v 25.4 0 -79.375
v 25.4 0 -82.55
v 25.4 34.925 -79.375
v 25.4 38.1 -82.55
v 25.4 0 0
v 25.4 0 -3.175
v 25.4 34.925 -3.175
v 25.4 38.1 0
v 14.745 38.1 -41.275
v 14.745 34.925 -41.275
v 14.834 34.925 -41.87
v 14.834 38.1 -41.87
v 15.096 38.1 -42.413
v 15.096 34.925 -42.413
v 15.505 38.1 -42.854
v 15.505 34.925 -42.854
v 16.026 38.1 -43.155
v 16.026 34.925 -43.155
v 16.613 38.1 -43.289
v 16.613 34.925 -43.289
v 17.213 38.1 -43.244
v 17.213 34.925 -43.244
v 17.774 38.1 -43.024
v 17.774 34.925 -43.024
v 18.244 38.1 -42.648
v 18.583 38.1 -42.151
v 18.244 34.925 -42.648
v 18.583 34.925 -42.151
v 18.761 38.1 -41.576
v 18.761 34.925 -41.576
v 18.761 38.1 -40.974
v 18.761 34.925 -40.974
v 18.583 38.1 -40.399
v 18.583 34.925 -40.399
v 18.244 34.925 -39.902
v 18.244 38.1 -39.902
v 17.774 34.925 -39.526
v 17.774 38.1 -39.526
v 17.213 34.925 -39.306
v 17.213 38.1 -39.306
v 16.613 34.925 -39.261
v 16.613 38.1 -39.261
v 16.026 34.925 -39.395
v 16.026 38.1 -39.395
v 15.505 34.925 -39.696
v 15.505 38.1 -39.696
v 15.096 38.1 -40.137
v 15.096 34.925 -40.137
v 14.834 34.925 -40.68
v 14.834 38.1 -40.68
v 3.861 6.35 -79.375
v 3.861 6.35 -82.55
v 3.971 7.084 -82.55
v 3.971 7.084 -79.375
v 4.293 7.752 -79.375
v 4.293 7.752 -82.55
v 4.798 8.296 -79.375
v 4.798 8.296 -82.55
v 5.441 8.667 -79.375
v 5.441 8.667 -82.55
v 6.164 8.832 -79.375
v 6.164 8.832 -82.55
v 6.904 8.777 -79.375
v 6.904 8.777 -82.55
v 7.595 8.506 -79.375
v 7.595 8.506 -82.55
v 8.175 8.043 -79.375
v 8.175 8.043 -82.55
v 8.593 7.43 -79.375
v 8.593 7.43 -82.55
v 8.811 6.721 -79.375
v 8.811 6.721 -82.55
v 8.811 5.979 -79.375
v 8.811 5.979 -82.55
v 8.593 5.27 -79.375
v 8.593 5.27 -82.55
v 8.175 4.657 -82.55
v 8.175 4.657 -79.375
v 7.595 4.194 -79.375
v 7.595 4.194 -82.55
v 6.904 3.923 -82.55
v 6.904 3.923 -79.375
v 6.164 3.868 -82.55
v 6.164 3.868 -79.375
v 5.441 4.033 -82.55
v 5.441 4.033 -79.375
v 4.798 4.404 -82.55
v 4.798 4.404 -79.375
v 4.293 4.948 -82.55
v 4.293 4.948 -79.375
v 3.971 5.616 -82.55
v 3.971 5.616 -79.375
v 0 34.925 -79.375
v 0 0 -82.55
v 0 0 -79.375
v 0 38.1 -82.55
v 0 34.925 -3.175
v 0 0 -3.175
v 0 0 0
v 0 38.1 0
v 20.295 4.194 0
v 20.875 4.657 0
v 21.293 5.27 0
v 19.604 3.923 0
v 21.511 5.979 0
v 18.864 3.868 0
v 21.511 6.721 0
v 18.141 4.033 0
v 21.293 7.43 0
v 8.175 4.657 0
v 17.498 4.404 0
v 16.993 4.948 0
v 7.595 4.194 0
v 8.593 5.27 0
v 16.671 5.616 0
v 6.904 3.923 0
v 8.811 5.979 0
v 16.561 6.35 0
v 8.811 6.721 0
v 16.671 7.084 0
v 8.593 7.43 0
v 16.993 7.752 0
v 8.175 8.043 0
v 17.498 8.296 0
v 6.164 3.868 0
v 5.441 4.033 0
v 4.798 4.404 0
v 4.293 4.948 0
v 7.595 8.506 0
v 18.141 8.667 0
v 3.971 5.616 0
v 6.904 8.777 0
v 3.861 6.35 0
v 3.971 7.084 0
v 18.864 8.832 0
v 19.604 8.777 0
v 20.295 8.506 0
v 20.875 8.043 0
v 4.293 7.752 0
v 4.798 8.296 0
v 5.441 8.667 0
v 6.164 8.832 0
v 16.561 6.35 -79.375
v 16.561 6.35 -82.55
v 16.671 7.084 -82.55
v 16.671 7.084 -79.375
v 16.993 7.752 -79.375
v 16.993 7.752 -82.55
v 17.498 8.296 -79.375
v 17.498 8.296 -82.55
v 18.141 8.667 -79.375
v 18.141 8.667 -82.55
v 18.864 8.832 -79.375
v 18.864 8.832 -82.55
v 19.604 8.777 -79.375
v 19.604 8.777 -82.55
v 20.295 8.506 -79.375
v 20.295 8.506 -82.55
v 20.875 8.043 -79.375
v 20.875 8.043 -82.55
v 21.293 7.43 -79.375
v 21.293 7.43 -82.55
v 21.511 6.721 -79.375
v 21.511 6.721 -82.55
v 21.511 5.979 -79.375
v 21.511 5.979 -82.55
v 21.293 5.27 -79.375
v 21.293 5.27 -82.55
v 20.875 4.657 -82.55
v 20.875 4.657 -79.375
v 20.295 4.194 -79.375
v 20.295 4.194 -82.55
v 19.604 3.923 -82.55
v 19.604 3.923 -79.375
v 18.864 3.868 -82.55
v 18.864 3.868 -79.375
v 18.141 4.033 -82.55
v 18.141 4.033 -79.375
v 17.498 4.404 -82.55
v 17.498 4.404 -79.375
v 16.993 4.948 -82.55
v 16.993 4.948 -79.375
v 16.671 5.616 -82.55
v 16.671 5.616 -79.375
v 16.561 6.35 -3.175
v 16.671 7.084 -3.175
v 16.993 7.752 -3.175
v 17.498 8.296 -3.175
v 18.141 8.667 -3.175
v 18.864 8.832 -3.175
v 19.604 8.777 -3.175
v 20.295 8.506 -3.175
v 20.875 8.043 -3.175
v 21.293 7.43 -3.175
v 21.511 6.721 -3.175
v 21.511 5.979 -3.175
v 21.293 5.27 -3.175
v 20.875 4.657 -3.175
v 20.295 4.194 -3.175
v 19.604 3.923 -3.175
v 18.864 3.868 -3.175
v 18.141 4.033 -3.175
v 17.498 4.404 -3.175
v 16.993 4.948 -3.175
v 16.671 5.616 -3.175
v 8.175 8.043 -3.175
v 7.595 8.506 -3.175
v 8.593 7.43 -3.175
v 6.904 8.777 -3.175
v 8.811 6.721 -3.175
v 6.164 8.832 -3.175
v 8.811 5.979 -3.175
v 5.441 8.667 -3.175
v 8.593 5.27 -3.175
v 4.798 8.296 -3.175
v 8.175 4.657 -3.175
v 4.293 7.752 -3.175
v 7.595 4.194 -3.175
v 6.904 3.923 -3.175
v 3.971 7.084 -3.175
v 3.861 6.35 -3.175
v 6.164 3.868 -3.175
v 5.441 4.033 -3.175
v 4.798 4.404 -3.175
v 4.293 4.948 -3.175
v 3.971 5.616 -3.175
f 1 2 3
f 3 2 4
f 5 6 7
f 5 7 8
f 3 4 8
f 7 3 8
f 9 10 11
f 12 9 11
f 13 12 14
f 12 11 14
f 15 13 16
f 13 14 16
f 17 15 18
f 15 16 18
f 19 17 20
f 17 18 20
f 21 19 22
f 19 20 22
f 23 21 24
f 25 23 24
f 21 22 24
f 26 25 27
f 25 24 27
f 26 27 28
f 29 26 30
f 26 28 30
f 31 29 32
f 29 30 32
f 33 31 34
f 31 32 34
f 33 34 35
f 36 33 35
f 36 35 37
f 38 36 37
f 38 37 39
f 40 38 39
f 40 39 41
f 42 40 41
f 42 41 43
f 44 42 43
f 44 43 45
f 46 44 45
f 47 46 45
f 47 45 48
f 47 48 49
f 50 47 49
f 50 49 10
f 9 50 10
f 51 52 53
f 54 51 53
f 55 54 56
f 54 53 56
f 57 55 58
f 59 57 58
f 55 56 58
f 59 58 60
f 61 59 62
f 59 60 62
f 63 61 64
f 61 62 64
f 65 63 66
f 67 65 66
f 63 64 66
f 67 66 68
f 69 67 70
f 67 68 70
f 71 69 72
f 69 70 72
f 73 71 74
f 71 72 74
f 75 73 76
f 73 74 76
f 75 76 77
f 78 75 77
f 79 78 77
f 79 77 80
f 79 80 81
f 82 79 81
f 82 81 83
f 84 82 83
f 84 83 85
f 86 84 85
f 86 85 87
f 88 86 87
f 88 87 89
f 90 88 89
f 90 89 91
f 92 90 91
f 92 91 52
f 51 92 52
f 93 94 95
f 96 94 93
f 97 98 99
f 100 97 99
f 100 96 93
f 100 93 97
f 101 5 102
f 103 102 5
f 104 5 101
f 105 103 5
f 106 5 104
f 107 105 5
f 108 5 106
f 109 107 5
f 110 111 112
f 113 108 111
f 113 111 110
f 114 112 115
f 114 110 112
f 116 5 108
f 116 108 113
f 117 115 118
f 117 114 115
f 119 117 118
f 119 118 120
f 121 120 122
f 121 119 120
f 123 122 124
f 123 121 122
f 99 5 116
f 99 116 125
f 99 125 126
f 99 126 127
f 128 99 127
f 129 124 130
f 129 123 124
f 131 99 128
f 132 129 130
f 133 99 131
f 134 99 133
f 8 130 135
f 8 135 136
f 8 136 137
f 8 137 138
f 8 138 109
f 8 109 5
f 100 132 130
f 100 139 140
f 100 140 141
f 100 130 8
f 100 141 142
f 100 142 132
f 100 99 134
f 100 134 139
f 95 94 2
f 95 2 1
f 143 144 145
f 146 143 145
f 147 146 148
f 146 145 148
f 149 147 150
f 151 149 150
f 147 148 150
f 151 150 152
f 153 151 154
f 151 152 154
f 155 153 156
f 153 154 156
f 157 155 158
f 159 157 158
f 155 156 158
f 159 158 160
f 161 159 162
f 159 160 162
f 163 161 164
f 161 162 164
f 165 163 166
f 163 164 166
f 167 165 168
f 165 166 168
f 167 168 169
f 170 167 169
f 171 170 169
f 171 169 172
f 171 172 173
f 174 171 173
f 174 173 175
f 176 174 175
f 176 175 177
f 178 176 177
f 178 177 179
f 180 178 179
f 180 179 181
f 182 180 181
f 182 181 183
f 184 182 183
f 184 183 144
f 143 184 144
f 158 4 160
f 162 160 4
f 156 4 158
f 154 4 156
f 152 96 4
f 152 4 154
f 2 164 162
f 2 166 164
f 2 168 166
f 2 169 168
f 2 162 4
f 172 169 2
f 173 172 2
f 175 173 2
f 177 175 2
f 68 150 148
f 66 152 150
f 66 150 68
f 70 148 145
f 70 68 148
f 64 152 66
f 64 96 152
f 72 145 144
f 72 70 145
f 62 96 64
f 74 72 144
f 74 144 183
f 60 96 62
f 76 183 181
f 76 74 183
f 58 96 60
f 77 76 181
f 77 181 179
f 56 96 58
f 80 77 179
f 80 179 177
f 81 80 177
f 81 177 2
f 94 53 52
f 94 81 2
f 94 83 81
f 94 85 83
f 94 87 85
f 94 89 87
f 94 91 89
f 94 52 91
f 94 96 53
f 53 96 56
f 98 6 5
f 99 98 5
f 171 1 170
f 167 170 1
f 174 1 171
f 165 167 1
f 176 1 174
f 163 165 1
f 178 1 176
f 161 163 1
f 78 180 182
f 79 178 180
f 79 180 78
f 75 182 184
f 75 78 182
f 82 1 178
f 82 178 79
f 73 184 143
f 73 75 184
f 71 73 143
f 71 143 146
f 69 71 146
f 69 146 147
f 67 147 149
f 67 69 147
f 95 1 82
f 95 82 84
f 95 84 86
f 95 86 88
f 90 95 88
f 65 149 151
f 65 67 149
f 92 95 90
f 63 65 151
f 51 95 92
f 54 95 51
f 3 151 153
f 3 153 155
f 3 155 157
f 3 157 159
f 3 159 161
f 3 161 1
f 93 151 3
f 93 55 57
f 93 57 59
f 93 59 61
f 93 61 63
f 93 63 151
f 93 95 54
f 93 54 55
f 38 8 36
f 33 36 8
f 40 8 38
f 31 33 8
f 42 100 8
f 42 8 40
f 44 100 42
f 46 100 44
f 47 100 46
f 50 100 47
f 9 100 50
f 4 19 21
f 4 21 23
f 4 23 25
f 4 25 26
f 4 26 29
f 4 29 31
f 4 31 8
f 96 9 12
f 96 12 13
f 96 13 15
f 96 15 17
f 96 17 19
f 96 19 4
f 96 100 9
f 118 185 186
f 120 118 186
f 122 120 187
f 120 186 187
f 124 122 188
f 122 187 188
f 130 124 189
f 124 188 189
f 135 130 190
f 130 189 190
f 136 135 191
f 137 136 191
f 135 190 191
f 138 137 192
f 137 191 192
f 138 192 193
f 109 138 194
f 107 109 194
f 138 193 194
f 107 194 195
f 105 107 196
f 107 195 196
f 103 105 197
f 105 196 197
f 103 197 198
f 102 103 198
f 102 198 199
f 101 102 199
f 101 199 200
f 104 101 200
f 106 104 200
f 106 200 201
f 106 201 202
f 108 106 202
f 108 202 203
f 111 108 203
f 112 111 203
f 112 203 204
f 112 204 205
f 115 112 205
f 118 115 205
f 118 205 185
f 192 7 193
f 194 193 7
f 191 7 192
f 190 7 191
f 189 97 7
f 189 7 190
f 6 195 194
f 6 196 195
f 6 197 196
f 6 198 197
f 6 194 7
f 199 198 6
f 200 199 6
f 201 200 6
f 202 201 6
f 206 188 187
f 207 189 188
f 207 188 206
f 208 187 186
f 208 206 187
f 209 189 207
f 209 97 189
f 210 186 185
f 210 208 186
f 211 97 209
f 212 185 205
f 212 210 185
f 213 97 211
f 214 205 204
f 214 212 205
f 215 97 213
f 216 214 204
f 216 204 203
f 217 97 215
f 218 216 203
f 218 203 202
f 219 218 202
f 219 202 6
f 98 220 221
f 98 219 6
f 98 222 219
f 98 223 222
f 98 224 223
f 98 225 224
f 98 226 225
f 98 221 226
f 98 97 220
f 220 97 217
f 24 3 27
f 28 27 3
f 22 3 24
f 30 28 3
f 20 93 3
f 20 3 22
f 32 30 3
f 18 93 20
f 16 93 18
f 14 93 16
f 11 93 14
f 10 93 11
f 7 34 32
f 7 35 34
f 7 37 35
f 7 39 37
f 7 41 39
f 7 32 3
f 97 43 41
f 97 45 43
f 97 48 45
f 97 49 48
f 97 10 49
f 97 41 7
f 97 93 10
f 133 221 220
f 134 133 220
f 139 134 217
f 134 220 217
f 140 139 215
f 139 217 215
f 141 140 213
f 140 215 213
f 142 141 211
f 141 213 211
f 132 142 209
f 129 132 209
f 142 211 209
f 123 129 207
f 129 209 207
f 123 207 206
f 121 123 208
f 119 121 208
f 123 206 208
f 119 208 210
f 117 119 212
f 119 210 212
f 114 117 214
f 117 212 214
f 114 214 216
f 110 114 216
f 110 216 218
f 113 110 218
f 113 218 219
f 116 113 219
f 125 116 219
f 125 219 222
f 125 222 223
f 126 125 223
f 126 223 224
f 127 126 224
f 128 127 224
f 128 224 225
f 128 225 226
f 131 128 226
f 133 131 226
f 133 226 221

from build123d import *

# Parameters (mm, degrees)
BOSS_EXTRUDE1_DEPTH        = 25.4
F_10_32_TAPPED_HOLE1_D     = 4.0386
F_10_32_TAPPED_HOLE1_DEPTH = 13.716
F_10_32_TAPPED_HOLE1_TIP   = 1.213317848
F_9_0_196_DIAMETER_HOLE1_D = 4.9784


with BuildPart() as part:
    # Sketch1 → Boss-Extrude1 (new body)
    with BuildSketch(Plane(origin=(0, 0, 0), x_dir=(0, 0, -1), z_dir=(1, 0, 0))):
        Polygon((82.55, 0), (79.375, 0), (79.375, 34.925), (3.175, 34.925), (3.175, 0), (0, 0), (0, 38.1), (82.55, 38.1), align=None)
    extrude(amount=BOSS_EXTRUDE1_DEPTH)

    # #10-32 Tapped Hole1
    with Locations(Plane(origin=(0, 38.1, 0), x_dir=(1, 0, 0), z_dir=(0, 1, 0))):
        with Locations((16.764, 41.275)):
            Hole(F_10_32_TAPPED_HOLE1_D / 2, depth=F_10_32_TAPPED_HOLE1_DEPTH)
            with Locations((0, 0, -(F_10_32_TAPPED_HOLE1_DEPTH + F_10_32_TAPPED_HOLE1_TIP / 2))):  # 118° drill point
                Cone(0, F_10_32_TAPPED_HOLE1_D / 2, F_10_32_TAPPED_HOLE1_TIP, mode=Mode.SUBTRACT)

    # #9 (0.196) Diameter Hole1 (through all)
    with Locations(Plane.XY):
        with Locations((6.35, 6.35), (19.05, 6.35)):
            Hole(F_9_0_196_DIAMETER_HOLE1_D / 2)


solid = part.part
